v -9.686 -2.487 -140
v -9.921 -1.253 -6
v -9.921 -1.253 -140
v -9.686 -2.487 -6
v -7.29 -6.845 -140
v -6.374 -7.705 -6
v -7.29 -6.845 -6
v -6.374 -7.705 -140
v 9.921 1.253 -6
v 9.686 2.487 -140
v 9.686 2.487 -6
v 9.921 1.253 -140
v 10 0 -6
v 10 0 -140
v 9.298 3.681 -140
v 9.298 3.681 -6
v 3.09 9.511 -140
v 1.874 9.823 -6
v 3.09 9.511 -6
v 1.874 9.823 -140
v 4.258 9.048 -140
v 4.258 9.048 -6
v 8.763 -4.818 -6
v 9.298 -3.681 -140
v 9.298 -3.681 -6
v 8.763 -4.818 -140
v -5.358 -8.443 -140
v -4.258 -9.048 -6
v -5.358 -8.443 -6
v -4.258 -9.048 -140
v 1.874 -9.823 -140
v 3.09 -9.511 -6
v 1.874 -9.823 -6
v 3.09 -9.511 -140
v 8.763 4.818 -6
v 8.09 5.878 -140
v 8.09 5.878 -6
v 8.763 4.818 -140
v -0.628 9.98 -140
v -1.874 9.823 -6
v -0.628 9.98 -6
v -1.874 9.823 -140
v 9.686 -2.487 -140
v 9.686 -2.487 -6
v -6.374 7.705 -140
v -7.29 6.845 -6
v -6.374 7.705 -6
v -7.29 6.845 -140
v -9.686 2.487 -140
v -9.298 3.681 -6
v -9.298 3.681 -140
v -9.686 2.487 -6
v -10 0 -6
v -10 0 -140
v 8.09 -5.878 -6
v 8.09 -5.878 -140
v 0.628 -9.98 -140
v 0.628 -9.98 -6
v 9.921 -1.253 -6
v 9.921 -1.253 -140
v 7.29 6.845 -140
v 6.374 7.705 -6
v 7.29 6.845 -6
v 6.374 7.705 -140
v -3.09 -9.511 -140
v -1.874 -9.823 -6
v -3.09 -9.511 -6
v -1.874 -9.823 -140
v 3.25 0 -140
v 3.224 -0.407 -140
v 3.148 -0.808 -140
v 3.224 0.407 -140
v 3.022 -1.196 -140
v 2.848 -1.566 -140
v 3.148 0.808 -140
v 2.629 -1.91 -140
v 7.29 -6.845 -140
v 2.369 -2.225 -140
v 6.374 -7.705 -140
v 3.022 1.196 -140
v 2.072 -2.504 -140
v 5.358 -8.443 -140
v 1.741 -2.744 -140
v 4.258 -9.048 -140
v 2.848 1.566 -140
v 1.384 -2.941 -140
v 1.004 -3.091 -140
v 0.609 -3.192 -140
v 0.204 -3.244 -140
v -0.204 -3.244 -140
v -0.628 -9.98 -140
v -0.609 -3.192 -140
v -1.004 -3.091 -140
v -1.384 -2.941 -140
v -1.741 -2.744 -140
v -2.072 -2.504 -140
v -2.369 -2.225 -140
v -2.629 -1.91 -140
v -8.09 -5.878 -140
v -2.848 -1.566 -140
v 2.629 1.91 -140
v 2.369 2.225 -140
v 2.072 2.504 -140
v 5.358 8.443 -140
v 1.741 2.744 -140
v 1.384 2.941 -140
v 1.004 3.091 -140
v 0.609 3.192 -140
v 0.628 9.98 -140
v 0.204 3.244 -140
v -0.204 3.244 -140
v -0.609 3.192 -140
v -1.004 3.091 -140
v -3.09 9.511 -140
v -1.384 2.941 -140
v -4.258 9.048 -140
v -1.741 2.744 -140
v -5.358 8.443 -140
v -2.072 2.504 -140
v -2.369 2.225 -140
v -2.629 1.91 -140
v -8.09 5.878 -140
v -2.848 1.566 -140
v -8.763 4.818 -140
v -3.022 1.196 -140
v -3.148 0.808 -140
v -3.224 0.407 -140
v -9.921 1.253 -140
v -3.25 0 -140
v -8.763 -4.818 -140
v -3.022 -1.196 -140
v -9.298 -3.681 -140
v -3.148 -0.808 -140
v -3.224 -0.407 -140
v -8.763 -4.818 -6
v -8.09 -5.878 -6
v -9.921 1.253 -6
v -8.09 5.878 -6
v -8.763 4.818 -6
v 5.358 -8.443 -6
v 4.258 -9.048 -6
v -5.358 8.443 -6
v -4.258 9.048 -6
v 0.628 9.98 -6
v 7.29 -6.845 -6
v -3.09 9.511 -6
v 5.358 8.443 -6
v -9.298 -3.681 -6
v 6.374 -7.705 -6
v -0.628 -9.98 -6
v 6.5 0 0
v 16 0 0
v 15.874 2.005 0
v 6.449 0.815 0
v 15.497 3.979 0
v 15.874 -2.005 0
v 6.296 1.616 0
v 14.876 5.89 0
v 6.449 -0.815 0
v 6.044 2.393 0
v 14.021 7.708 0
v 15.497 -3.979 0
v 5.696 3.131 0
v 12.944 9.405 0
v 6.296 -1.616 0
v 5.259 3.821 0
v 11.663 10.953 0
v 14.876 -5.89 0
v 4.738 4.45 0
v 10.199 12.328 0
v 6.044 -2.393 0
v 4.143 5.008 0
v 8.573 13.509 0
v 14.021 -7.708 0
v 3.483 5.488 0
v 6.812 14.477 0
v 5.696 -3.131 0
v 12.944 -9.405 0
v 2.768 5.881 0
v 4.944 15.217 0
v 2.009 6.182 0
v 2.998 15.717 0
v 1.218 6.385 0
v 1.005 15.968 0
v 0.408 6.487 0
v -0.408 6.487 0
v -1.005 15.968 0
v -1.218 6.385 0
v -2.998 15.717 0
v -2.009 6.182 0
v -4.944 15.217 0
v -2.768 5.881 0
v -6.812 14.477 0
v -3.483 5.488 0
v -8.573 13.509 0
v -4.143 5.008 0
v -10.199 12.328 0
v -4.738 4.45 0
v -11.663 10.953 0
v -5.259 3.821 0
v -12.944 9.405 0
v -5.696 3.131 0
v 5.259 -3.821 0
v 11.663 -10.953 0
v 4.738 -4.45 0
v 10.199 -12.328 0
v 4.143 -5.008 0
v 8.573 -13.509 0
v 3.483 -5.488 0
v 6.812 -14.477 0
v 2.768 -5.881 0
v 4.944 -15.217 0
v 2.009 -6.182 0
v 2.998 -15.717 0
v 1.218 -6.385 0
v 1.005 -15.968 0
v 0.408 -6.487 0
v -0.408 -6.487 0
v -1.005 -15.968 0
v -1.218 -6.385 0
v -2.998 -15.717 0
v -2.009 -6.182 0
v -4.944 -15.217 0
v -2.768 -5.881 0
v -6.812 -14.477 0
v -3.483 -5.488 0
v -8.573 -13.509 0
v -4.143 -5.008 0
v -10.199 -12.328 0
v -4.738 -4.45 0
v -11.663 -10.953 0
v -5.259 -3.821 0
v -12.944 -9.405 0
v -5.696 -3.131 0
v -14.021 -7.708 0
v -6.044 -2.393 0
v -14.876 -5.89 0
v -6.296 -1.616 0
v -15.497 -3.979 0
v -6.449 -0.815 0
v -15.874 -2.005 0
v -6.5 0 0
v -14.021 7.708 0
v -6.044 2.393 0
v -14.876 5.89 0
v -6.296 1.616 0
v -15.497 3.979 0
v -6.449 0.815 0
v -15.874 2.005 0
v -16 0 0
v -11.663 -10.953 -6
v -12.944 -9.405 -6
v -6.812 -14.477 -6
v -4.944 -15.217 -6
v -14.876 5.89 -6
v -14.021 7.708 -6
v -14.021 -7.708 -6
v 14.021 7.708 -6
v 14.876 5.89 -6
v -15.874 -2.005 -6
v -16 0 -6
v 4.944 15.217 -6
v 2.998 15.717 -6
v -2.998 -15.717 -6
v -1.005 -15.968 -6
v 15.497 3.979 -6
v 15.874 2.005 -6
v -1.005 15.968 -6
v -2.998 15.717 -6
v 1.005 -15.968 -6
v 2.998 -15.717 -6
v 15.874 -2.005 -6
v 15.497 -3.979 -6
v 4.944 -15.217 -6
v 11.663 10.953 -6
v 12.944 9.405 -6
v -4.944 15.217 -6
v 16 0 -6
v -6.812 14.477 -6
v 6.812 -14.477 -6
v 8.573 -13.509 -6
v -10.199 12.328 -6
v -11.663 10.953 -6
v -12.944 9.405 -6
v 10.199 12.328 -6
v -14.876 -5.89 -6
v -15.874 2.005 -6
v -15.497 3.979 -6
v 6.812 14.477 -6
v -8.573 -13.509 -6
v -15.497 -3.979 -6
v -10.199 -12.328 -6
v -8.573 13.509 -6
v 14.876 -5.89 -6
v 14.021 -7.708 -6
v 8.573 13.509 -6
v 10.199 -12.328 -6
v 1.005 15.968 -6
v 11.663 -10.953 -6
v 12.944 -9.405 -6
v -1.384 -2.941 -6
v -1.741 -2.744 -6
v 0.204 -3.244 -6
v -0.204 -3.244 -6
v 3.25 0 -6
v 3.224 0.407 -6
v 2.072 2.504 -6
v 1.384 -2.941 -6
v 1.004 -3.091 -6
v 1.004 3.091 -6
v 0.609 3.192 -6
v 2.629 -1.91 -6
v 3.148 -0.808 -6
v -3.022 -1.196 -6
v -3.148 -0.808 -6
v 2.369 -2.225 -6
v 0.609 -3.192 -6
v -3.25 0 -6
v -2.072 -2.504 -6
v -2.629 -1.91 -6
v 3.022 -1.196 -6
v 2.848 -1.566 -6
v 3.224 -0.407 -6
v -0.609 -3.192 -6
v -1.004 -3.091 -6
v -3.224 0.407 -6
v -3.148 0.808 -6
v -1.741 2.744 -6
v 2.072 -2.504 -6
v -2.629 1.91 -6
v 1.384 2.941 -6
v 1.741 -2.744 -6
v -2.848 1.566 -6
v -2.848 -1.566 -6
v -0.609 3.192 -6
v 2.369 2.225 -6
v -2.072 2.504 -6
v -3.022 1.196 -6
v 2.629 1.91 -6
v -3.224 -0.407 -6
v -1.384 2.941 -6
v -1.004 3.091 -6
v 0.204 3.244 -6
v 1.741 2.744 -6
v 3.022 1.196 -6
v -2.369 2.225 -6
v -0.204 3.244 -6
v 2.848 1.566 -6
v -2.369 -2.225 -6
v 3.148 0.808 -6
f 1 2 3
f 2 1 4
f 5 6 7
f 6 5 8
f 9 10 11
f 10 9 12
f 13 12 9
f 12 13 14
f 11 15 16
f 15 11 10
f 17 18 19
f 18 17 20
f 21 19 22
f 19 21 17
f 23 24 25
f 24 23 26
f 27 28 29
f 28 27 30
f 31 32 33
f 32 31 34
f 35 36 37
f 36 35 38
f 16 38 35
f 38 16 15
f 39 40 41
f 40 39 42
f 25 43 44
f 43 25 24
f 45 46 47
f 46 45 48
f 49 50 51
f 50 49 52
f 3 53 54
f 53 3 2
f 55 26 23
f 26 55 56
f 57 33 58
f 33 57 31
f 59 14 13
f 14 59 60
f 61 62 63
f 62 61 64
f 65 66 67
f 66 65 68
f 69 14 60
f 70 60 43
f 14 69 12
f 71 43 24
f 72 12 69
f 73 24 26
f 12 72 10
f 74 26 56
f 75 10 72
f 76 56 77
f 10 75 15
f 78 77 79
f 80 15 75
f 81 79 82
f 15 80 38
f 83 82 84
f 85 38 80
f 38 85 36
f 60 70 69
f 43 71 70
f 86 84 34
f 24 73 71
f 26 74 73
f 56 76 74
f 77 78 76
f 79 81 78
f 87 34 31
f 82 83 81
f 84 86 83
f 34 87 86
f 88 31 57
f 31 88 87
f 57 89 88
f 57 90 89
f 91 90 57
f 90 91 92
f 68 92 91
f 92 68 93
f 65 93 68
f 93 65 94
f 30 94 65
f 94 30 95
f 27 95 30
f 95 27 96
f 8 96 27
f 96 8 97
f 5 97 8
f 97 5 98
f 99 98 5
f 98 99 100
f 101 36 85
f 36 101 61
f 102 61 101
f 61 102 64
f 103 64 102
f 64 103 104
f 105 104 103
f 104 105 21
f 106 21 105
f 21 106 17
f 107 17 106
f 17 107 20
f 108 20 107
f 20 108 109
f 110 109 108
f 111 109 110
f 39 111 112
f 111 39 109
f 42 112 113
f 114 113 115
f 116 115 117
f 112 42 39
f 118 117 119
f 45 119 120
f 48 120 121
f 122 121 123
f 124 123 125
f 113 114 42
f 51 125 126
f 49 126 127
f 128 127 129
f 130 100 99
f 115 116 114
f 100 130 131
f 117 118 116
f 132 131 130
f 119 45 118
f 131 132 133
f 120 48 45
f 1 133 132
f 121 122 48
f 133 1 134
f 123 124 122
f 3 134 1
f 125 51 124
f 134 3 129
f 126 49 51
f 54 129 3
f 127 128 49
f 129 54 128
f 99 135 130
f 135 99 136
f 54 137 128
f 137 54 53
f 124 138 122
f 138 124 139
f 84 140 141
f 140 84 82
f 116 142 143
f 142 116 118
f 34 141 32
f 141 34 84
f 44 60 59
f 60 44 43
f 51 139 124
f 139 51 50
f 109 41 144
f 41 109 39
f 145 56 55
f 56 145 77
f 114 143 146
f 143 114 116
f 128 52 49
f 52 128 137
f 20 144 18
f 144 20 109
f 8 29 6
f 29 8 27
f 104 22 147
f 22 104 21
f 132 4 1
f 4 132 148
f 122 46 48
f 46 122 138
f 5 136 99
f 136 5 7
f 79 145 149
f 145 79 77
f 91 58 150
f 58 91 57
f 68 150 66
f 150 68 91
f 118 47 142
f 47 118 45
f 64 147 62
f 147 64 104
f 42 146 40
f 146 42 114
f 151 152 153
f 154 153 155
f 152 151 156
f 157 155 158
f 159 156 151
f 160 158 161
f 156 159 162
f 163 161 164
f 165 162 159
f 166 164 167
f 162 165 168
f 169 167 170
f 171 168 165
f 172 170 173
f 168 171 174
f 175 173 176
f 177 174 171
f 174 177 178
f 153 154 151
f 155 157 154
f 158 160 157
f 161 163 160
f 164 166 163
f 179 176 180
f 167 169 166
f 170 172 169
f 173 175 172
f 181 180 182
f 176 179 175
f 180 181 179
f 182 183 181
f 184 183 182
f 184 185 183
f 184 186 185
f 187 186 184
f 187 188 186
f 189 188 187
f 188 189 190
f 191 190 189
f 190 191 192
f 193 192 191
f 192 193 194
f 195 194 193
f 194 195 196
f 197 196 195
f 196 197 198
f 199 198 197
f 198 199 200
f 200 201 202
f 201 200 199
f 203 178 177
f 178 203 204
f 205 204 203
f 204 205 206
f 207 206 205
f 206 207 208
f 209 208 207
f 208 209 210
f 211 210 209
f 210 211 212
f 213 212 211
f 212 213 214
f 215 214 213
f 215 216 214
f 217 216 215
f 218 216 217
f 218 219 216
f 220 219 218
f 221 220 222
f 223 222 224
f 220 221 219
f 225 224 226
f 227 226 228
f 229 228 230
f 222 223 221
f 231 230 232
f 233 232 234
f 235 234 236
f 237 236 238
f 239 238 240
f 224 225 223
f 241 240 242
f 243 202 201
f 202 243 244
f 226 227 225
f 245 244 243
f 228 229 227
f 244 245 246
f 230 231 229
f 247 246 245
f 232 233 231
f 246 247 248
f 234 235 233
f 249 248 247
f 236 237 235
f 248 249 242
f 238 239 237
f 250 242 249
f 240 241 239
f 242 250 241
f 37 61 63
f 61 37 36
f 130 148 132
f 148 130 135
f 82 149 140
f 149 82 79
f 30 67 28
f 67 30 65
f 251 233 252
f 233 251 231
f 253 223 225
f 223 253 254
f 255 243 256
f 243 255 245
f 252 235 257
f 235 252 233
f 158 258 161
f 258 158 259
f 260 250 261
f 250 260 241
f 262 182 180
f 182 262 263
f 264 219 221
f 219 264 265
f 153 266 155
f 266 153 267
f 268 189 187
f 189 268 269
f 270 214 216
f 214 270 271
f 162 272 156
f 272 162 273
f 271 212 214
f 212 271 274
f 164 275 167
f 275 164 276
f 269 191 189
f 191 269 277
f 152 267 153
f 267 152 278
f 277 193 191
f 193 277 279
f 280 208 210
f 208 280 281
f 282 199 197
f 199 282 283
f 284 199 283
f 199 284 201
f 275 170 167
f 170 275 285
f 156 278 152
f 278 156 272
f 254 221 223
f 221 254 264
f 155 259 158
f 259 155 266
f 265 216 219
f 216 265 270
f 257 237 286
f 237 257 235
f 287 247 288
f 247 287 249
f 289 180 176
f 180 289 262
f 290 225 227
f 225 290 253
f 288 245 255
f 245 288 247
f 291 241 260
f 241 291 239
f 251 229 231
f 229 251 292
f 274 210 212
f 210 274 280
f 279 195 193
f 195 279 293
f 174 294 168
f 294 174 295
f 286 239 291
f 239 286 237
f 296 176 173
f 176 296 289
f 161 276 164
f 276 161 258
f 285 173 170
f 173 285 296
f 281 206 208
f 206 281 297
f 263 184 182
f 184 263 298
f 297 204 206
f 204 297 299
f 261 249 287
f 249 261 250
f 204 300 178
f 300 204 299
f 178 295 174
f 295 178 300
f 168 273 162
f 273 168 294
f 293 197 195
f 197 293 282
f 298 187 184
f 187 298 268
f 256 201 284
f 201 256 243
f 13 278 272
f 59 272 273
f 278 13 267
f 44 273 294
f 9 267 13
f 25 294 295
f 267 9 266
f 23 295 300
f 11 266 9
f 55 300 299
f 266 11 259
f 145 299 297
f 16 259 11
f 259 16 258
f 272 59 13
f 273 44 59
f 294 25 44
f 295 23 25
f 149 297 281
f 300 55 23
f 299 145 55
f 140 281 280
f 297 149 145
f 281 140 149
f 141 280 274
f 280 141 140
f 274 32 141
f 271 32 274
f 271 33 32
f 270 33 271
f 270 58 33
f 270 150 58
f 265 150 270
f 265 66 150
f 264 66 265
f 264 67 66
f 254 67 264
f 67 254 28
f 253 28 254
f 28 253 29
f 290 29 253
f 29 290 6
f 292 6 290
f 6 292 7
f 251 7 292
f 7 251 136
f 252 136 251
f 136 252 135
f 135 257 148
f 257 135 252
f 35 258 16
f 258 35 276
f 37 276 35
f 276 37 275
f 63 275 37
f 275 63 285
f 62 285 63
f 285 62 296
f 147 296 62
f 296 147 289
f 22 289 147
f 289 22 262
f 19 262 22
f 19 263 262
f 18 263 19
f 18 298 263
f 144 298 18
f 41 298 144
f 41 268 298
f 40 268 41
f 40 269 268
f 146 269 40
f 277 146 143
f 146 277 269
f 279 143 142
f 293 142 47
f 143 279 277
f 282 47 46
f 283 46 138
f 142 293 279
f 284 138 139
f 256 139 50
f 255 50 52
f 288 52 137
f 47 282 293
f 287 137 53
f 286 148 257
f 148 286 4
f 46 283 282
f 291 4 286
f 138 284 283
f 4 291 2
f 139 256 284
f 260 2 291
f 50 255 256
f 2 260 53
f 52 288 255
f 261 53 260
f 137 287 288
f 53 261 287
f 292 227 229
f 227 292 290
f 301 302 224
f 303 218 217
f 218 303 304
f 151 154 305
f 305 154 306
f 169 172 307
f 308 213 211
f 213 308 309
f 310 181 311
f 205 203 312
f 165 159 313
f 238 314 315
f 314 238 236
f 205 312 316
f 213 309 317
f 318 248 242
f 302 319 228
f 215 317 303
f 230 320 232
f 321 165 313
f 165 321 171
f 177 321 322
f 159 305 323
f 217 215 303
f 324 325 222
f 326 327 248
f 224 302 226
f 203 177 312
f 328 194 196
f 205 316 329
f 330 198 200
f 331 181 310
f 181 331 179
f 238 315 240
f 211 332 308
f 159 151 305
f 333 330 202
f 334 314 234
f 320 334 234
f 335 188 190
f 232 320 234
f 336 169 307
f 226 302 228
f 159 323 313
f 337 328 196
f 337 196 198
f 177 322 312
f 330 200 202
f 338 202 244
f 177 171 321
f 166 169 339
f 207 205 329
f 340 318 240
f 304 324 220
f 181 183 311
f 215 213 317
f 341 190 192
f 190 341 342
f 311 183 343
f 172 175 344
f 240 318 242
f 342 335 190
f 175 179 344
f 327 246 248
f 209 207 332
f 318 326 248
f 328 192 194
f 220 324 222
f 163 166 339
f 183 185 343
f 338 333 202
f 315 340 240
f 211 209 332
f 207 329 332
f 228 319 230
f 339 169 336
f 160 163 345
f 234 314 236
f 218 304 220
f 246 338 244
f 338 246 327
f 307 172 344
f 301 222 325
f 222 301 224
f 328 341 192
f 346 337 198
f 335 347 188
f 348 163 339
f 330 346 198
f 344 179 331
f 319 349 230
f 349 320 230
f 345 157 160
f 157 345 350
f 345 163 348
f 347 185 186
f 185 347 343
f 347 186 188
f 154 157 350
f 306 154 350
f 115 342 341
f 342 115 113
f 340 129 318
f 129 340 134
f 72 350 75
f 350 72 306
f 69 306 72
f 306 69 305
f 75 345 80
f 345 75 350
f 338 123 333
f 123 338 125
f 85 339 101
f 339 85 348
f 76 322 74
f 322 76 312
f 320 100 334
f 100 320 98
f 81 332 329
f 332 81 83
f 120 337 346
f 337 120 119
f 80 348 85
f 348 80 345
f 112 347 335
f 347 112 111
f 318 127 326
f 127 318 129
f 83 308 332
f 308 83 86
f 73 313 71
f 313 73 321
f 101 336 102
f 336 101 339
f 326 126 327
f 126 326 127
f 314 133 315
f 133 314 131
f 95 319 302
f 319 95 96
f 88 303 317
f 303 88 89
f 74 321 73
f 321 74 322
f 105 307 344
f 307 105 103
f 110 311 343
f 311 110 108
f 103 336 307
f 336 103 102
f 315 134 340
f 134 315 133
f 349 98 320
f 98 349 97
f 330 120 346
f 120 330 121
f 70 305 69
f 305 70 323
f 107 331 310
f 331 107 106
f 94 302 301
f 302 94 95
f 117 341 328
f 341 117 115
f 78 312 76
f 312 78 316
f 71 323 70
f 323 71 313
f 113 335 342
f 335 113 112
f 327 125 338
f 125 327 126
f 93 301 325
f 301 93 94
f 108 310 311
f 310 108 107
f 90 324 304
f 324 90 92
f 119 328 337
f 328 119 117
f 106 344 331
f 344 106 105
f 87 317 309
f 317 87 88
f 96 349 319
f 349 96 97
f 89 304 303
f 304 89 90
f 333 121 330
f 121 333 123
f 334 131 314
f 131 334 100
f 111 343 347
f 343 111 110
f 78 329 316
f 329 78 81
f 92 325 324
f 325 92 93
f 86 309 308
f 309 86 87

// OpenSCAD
$fn = 50;


difference() {
	union() {
		translate(v = [0, 0, -140.0000000000]) {
			cylinder(h = 140, r = 10.0000000000);
		}
		translate(v = [0, 0, -6.0000000000]) {
			cylinder(h = 6, r = 16.0000000000);
		}
	}
	union() {
		translate(v = [0, 0, 0]) {
			rotate(a = [0, 0, 0]) {
				difference() {
					union() {
						#translate(v = [0, 0, -140.0000000000]) {
							cylinder(h = 140, r = 2.2500000000);
						}
						#translate(v = [0, 0, -6]) {
							cylinder(h = 6, r = 10.0000000000, r1 = 3.2500000000, r2 = 6.5000000000);
						}
						#translate(v = [0, 0, -140.0000000000]) {
							cylinder(h = 140, r = 3.2500000000);
						}
						#translate(v = [0, 0, -140.0000000000]) {
							cylinder(h = 140, r = 2.2500000000);
						}
					}
					union();
				}
			}
		}
	}
}
